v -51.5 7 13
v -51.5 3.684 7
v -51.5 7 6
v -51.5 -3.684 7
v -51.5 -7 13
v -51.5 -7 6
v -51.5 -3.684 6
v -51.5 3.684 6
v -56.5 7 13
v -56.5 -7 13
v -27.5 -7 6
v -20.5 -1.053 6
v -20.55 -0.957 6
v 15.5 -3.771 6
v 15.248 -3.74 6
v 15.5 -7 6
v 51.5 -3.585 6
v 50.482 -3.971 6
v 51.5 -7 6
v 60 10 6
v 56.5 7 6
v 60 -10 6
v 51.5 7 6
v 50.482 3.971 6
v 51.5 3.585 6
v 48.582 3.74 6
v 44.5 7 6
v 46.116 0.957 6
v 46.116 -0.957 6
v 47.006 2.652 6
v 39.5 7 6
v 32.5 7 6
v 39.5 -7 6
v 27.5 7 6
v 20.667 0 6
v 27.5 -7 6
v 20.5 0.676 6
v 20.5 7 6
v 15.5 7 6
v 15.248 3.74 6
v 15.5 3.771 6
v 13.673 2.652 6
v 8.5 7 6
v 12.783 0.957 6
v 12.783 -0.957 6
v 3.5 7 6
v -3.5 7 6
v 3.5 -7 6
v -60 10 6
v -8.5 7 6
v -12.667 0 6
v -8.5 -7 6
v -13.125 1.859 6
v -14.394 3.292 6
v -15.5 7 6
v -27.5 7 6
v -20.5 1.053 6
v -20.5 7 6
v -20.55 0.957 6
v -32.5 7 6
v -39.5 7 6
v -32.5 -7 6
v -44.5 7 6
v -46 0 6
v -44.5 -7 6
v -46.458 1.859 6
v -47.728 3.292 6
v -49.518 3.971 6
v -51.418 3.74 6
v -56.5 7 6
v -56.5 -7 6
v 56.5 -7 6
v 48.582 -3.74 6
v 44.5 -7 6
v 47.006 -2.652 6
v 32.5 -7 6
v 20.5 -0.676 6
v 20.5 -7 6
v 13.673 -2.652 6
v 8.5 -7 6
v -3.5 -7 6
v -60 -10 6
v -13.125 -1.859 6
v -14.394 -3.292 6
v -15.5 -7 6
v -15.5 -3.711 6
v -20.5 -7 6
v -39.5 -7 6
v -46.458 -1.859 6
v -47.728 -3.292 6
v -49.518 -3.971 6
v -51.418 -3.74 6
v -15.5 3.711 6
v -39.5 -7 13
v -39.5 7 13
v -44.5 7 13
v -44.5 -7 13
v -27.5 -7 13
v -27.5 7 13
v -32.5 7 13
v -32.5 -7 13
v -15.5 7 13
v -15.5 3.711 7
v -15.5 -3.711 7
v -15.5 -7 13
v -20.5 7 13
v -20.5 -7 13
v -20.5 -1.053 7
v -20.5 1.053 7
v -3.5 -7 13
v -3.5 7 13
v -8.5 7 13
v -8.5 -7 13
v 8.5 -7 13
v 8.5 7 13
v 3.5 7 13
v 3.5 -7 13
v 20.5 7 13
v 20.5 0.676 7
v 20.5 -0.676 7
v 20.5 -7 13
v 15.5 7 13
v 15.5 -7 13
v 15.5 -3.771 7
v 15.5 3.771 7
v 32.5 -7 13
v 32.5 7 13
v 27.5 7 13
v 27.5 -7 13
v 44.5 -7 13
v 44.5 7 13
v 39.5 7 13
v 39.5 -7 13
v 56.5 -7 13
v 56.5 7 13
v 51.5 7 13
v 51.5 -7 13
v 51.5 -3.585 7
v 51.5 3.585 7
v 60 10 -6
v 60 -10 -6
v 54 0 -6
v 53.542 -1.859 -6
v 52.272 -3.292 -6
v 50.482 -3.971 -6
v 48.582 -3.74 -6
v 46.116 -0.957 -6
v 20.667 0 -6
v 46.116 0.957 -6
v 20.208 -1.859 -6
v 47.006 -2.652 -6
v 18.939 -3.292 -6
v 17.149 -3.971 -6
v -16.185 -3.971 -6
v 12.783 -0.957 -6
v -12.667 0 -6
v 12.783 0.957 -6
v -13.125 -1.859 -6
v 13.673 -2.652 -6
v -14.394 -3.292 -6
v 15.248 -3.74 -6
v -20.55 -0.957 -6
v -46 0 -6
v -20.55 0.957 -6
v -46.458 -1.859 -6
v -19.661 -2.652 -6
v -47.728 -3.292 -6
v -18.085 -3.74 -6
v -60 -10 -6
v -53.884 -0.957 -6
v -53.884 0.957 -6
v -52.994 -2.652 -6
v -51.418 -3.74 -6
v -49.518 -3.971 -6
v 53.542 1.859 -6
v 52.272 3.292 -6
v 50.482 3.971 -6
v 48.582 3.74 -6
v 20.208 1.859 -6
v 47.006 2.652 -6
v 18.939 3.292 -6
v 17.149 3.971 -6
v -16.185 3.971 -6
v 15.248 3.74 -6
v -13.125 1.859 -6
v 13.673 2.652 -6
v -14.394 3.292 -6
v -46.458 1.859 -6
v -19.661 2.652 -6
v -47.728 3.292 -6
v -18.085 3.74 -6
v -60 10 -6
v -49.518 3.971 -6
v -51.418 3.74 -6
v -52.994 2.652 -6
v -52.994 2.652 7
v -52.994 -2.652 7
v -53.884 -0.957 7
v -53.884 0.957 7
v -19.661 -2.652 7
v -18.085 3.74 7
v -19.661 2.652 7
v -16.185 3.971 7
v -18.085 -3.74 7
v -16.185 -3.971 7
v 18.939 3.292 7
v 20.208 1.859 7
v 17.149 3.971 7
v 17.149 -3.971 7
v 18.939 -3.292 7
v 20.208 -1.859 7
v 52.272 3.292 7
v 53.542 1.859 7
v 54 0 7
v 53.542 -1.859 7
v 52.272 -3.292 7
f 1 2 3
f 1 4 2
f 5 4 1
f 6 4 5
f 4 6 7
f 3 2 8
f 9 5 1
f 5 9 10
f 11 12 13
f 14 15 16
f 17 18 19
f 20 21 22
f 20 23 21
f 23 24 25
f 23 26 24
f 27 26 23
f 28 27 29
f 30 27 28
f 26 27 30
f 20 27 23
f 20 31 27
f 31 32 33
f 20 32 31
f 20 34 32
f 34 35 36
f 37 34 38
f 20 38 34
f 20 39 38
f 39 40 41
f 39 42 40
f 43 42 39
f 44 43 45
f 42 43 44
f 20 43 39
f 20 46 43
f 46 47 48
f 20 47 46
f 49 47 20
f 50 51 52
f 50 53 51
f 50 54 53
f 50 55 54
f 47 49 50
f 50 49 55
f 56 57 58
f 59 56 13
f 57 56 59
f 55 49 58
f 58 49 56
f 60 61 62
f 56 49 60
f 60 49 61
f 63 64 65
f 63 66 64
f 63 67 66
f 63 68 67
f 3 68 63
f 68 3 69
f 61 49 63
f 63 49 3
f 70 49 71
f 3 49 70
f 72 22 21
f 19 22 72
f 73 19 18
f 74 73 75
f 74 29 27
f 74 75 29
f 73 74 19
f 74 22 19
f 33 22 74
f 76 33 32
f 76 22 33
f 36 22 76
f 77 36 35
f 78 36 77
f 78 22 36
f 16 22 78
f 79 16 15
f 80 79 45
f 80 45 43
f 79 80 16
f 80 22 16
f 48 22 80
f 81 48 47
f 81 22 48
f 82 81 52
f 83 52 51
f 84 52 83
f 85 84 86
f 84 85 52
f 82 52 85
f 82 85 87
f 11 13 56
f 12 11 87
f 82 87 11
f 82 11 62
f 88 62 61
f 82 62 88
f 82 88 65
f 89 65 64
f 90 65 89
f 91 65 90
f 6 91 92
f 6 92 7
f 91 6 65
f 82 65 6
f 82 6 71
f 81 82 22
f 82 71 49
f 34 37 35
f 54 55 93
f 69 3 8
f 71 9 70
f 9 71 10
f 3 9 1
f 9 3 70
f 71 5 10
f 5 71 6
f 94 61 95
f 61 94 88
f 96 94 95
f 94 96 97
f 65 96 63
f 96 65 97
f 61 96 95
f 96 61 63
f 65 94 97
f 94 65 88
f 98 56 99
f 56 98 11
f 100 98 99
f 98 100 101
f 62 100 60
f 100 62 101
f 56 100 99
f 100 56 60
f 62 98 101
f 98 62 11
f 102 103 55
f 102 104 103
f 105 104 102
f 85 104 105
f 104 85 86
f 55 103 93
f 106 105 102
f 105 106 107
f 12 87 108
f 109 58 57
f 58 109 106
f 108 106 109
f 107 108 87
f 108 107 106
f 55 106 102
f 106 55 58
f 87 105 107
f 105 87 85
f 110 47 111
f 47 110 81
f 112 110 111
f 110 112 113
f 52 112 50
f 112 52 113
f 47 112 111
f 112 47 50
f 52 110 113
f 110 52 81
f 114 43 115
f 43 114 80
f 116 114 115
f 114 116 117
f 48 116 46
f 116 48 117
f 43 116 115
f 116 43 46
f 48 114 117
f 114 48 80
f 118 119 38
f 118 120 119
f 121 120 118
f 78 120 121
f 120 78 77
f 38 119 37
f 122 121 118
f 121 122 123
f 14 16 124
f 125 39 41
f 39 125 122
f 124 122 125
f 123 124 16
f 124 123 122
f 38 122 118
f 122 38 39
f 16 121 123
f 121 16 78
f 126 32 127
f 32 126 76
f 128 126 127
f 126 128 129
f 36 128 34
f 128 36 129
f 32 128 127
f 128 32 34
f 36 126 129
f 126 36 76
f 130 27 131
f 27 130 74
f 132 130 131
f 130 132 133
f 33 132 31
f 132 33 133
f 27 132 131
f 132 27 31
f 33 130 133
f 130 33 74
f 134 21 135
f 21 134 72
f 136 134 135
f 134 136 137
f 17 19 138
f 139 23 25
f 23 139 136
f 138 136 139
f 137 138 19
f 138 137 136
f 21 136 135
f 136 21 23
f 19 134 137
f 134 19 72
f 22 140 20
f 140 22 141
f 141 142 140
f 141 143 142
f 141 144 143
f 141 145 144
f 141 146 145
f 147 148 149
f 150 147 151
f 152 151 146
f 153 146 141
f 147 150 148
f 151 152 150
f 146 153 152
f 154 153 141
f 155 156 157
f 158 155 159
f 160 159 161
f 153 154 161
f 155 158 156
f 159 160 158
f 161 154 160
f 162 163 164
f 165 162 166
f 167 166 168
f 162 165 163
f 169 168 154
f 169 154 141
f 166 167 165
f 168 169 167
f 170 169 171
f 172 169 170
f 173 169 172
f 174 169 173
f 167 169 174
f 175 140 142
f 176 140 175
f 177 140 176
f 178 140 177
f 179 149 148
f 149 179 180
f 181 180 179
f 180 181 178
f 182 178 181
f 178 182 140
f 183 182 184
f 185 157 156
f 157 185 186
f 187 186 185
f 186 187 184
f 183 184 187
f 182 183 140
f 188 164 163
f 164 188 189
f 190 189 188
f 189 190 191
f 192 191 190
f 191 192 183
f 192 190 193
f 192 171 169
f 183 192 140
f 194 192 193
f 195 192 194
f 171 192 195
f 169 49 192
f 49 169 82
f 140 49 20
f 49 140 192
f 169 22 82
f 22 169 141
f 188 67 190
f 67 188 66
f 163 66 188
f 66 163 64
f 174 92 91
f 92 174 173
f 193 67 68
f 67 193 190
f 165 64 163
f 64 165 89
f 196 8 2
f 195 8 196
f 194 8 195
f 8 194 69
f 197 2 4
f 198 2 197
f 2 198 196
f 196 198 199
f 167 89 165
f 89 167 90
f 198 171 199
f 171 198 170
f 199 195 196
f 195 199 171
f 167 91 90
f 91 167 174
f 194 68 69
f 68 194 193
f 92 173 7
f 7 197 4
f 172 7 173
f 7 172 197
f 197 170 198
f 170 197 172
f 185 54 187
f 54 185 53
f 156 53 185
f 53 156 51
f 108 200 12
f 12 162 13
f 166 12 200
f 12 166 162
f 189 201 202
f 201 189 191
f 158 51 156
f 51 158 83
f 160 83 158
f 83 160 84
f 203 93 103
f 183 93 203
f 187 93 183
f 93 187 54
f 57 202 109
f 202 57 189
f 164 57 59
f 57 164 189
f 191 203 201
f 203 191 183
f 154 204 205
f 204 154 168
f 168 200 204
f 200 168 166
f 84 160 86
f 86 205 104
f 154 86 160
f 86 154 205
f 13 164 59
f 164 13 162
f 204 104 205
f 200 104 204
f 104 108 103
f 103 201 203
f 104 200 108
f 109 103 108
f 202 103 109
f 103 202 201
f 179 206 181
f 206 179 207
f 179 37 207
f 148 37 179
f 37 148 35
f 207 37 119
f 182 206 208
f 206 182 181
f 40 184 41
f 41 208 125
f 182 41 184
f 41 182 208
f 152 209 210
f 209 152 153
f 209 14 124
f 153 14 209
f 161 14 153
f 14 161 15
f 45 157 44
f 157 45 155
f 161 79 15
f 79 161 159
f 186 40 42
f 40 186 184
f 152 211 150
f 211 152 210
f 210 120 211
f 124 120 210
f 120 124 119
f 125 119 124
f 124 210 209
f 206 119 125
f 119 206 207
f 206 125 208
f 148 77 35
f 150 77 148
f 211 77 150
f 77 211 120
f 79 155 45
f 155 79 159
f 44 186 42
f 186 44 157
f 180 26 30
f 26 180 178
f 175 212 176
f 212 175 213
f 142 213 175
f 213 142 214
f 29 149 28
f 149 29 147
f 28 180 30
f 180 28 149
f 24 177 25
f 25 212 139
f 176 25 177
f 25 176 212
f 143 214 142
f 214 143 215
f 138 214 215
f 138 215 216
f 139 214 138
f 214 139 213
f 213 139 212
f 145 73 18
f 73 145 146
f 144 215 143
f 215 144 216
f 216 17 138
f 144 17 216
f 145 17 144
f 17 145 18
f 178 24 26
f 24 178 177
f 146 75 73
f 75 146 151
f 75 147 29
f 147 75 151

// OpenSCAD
// 3DScad sample: linear gear rack
// Uses only the currently round-trippable subset.

module scene_model() {
    rack_l = 120;
    rack_w = 20;
    rack_h = 12;
    tooth_count = 10;
    tooth_w = 5;
    tooth_gap = 7;
    tooth_h = 7;
    hole_r = 4;

    difference() {
        union() {
            cube([rack_l, rack_w, rack_h], center=true);
            for (i = [0 : 1 : tooth_count - 1]) {
                translate([-(tooth_count - 1) * (tooth_w + tooth_gap) / 2 + i * (tooth_w + tooth_gap), 0, rack_h / 2 + tooth_h / 2]) {
                    cube([tooth_w, rack_w - 6, tooth_h], center=true);
                }
            }
        }
        for (i = [0 : 1 : 3]) {
            translate([-(rack_l / 2 - 10) + i * (rack_l - 20) / 3, 0, 0]) {
                cylinder(h=rack_h + 2, r=hole_r, center=true);
            }
        }
    }
}

scene_model();
